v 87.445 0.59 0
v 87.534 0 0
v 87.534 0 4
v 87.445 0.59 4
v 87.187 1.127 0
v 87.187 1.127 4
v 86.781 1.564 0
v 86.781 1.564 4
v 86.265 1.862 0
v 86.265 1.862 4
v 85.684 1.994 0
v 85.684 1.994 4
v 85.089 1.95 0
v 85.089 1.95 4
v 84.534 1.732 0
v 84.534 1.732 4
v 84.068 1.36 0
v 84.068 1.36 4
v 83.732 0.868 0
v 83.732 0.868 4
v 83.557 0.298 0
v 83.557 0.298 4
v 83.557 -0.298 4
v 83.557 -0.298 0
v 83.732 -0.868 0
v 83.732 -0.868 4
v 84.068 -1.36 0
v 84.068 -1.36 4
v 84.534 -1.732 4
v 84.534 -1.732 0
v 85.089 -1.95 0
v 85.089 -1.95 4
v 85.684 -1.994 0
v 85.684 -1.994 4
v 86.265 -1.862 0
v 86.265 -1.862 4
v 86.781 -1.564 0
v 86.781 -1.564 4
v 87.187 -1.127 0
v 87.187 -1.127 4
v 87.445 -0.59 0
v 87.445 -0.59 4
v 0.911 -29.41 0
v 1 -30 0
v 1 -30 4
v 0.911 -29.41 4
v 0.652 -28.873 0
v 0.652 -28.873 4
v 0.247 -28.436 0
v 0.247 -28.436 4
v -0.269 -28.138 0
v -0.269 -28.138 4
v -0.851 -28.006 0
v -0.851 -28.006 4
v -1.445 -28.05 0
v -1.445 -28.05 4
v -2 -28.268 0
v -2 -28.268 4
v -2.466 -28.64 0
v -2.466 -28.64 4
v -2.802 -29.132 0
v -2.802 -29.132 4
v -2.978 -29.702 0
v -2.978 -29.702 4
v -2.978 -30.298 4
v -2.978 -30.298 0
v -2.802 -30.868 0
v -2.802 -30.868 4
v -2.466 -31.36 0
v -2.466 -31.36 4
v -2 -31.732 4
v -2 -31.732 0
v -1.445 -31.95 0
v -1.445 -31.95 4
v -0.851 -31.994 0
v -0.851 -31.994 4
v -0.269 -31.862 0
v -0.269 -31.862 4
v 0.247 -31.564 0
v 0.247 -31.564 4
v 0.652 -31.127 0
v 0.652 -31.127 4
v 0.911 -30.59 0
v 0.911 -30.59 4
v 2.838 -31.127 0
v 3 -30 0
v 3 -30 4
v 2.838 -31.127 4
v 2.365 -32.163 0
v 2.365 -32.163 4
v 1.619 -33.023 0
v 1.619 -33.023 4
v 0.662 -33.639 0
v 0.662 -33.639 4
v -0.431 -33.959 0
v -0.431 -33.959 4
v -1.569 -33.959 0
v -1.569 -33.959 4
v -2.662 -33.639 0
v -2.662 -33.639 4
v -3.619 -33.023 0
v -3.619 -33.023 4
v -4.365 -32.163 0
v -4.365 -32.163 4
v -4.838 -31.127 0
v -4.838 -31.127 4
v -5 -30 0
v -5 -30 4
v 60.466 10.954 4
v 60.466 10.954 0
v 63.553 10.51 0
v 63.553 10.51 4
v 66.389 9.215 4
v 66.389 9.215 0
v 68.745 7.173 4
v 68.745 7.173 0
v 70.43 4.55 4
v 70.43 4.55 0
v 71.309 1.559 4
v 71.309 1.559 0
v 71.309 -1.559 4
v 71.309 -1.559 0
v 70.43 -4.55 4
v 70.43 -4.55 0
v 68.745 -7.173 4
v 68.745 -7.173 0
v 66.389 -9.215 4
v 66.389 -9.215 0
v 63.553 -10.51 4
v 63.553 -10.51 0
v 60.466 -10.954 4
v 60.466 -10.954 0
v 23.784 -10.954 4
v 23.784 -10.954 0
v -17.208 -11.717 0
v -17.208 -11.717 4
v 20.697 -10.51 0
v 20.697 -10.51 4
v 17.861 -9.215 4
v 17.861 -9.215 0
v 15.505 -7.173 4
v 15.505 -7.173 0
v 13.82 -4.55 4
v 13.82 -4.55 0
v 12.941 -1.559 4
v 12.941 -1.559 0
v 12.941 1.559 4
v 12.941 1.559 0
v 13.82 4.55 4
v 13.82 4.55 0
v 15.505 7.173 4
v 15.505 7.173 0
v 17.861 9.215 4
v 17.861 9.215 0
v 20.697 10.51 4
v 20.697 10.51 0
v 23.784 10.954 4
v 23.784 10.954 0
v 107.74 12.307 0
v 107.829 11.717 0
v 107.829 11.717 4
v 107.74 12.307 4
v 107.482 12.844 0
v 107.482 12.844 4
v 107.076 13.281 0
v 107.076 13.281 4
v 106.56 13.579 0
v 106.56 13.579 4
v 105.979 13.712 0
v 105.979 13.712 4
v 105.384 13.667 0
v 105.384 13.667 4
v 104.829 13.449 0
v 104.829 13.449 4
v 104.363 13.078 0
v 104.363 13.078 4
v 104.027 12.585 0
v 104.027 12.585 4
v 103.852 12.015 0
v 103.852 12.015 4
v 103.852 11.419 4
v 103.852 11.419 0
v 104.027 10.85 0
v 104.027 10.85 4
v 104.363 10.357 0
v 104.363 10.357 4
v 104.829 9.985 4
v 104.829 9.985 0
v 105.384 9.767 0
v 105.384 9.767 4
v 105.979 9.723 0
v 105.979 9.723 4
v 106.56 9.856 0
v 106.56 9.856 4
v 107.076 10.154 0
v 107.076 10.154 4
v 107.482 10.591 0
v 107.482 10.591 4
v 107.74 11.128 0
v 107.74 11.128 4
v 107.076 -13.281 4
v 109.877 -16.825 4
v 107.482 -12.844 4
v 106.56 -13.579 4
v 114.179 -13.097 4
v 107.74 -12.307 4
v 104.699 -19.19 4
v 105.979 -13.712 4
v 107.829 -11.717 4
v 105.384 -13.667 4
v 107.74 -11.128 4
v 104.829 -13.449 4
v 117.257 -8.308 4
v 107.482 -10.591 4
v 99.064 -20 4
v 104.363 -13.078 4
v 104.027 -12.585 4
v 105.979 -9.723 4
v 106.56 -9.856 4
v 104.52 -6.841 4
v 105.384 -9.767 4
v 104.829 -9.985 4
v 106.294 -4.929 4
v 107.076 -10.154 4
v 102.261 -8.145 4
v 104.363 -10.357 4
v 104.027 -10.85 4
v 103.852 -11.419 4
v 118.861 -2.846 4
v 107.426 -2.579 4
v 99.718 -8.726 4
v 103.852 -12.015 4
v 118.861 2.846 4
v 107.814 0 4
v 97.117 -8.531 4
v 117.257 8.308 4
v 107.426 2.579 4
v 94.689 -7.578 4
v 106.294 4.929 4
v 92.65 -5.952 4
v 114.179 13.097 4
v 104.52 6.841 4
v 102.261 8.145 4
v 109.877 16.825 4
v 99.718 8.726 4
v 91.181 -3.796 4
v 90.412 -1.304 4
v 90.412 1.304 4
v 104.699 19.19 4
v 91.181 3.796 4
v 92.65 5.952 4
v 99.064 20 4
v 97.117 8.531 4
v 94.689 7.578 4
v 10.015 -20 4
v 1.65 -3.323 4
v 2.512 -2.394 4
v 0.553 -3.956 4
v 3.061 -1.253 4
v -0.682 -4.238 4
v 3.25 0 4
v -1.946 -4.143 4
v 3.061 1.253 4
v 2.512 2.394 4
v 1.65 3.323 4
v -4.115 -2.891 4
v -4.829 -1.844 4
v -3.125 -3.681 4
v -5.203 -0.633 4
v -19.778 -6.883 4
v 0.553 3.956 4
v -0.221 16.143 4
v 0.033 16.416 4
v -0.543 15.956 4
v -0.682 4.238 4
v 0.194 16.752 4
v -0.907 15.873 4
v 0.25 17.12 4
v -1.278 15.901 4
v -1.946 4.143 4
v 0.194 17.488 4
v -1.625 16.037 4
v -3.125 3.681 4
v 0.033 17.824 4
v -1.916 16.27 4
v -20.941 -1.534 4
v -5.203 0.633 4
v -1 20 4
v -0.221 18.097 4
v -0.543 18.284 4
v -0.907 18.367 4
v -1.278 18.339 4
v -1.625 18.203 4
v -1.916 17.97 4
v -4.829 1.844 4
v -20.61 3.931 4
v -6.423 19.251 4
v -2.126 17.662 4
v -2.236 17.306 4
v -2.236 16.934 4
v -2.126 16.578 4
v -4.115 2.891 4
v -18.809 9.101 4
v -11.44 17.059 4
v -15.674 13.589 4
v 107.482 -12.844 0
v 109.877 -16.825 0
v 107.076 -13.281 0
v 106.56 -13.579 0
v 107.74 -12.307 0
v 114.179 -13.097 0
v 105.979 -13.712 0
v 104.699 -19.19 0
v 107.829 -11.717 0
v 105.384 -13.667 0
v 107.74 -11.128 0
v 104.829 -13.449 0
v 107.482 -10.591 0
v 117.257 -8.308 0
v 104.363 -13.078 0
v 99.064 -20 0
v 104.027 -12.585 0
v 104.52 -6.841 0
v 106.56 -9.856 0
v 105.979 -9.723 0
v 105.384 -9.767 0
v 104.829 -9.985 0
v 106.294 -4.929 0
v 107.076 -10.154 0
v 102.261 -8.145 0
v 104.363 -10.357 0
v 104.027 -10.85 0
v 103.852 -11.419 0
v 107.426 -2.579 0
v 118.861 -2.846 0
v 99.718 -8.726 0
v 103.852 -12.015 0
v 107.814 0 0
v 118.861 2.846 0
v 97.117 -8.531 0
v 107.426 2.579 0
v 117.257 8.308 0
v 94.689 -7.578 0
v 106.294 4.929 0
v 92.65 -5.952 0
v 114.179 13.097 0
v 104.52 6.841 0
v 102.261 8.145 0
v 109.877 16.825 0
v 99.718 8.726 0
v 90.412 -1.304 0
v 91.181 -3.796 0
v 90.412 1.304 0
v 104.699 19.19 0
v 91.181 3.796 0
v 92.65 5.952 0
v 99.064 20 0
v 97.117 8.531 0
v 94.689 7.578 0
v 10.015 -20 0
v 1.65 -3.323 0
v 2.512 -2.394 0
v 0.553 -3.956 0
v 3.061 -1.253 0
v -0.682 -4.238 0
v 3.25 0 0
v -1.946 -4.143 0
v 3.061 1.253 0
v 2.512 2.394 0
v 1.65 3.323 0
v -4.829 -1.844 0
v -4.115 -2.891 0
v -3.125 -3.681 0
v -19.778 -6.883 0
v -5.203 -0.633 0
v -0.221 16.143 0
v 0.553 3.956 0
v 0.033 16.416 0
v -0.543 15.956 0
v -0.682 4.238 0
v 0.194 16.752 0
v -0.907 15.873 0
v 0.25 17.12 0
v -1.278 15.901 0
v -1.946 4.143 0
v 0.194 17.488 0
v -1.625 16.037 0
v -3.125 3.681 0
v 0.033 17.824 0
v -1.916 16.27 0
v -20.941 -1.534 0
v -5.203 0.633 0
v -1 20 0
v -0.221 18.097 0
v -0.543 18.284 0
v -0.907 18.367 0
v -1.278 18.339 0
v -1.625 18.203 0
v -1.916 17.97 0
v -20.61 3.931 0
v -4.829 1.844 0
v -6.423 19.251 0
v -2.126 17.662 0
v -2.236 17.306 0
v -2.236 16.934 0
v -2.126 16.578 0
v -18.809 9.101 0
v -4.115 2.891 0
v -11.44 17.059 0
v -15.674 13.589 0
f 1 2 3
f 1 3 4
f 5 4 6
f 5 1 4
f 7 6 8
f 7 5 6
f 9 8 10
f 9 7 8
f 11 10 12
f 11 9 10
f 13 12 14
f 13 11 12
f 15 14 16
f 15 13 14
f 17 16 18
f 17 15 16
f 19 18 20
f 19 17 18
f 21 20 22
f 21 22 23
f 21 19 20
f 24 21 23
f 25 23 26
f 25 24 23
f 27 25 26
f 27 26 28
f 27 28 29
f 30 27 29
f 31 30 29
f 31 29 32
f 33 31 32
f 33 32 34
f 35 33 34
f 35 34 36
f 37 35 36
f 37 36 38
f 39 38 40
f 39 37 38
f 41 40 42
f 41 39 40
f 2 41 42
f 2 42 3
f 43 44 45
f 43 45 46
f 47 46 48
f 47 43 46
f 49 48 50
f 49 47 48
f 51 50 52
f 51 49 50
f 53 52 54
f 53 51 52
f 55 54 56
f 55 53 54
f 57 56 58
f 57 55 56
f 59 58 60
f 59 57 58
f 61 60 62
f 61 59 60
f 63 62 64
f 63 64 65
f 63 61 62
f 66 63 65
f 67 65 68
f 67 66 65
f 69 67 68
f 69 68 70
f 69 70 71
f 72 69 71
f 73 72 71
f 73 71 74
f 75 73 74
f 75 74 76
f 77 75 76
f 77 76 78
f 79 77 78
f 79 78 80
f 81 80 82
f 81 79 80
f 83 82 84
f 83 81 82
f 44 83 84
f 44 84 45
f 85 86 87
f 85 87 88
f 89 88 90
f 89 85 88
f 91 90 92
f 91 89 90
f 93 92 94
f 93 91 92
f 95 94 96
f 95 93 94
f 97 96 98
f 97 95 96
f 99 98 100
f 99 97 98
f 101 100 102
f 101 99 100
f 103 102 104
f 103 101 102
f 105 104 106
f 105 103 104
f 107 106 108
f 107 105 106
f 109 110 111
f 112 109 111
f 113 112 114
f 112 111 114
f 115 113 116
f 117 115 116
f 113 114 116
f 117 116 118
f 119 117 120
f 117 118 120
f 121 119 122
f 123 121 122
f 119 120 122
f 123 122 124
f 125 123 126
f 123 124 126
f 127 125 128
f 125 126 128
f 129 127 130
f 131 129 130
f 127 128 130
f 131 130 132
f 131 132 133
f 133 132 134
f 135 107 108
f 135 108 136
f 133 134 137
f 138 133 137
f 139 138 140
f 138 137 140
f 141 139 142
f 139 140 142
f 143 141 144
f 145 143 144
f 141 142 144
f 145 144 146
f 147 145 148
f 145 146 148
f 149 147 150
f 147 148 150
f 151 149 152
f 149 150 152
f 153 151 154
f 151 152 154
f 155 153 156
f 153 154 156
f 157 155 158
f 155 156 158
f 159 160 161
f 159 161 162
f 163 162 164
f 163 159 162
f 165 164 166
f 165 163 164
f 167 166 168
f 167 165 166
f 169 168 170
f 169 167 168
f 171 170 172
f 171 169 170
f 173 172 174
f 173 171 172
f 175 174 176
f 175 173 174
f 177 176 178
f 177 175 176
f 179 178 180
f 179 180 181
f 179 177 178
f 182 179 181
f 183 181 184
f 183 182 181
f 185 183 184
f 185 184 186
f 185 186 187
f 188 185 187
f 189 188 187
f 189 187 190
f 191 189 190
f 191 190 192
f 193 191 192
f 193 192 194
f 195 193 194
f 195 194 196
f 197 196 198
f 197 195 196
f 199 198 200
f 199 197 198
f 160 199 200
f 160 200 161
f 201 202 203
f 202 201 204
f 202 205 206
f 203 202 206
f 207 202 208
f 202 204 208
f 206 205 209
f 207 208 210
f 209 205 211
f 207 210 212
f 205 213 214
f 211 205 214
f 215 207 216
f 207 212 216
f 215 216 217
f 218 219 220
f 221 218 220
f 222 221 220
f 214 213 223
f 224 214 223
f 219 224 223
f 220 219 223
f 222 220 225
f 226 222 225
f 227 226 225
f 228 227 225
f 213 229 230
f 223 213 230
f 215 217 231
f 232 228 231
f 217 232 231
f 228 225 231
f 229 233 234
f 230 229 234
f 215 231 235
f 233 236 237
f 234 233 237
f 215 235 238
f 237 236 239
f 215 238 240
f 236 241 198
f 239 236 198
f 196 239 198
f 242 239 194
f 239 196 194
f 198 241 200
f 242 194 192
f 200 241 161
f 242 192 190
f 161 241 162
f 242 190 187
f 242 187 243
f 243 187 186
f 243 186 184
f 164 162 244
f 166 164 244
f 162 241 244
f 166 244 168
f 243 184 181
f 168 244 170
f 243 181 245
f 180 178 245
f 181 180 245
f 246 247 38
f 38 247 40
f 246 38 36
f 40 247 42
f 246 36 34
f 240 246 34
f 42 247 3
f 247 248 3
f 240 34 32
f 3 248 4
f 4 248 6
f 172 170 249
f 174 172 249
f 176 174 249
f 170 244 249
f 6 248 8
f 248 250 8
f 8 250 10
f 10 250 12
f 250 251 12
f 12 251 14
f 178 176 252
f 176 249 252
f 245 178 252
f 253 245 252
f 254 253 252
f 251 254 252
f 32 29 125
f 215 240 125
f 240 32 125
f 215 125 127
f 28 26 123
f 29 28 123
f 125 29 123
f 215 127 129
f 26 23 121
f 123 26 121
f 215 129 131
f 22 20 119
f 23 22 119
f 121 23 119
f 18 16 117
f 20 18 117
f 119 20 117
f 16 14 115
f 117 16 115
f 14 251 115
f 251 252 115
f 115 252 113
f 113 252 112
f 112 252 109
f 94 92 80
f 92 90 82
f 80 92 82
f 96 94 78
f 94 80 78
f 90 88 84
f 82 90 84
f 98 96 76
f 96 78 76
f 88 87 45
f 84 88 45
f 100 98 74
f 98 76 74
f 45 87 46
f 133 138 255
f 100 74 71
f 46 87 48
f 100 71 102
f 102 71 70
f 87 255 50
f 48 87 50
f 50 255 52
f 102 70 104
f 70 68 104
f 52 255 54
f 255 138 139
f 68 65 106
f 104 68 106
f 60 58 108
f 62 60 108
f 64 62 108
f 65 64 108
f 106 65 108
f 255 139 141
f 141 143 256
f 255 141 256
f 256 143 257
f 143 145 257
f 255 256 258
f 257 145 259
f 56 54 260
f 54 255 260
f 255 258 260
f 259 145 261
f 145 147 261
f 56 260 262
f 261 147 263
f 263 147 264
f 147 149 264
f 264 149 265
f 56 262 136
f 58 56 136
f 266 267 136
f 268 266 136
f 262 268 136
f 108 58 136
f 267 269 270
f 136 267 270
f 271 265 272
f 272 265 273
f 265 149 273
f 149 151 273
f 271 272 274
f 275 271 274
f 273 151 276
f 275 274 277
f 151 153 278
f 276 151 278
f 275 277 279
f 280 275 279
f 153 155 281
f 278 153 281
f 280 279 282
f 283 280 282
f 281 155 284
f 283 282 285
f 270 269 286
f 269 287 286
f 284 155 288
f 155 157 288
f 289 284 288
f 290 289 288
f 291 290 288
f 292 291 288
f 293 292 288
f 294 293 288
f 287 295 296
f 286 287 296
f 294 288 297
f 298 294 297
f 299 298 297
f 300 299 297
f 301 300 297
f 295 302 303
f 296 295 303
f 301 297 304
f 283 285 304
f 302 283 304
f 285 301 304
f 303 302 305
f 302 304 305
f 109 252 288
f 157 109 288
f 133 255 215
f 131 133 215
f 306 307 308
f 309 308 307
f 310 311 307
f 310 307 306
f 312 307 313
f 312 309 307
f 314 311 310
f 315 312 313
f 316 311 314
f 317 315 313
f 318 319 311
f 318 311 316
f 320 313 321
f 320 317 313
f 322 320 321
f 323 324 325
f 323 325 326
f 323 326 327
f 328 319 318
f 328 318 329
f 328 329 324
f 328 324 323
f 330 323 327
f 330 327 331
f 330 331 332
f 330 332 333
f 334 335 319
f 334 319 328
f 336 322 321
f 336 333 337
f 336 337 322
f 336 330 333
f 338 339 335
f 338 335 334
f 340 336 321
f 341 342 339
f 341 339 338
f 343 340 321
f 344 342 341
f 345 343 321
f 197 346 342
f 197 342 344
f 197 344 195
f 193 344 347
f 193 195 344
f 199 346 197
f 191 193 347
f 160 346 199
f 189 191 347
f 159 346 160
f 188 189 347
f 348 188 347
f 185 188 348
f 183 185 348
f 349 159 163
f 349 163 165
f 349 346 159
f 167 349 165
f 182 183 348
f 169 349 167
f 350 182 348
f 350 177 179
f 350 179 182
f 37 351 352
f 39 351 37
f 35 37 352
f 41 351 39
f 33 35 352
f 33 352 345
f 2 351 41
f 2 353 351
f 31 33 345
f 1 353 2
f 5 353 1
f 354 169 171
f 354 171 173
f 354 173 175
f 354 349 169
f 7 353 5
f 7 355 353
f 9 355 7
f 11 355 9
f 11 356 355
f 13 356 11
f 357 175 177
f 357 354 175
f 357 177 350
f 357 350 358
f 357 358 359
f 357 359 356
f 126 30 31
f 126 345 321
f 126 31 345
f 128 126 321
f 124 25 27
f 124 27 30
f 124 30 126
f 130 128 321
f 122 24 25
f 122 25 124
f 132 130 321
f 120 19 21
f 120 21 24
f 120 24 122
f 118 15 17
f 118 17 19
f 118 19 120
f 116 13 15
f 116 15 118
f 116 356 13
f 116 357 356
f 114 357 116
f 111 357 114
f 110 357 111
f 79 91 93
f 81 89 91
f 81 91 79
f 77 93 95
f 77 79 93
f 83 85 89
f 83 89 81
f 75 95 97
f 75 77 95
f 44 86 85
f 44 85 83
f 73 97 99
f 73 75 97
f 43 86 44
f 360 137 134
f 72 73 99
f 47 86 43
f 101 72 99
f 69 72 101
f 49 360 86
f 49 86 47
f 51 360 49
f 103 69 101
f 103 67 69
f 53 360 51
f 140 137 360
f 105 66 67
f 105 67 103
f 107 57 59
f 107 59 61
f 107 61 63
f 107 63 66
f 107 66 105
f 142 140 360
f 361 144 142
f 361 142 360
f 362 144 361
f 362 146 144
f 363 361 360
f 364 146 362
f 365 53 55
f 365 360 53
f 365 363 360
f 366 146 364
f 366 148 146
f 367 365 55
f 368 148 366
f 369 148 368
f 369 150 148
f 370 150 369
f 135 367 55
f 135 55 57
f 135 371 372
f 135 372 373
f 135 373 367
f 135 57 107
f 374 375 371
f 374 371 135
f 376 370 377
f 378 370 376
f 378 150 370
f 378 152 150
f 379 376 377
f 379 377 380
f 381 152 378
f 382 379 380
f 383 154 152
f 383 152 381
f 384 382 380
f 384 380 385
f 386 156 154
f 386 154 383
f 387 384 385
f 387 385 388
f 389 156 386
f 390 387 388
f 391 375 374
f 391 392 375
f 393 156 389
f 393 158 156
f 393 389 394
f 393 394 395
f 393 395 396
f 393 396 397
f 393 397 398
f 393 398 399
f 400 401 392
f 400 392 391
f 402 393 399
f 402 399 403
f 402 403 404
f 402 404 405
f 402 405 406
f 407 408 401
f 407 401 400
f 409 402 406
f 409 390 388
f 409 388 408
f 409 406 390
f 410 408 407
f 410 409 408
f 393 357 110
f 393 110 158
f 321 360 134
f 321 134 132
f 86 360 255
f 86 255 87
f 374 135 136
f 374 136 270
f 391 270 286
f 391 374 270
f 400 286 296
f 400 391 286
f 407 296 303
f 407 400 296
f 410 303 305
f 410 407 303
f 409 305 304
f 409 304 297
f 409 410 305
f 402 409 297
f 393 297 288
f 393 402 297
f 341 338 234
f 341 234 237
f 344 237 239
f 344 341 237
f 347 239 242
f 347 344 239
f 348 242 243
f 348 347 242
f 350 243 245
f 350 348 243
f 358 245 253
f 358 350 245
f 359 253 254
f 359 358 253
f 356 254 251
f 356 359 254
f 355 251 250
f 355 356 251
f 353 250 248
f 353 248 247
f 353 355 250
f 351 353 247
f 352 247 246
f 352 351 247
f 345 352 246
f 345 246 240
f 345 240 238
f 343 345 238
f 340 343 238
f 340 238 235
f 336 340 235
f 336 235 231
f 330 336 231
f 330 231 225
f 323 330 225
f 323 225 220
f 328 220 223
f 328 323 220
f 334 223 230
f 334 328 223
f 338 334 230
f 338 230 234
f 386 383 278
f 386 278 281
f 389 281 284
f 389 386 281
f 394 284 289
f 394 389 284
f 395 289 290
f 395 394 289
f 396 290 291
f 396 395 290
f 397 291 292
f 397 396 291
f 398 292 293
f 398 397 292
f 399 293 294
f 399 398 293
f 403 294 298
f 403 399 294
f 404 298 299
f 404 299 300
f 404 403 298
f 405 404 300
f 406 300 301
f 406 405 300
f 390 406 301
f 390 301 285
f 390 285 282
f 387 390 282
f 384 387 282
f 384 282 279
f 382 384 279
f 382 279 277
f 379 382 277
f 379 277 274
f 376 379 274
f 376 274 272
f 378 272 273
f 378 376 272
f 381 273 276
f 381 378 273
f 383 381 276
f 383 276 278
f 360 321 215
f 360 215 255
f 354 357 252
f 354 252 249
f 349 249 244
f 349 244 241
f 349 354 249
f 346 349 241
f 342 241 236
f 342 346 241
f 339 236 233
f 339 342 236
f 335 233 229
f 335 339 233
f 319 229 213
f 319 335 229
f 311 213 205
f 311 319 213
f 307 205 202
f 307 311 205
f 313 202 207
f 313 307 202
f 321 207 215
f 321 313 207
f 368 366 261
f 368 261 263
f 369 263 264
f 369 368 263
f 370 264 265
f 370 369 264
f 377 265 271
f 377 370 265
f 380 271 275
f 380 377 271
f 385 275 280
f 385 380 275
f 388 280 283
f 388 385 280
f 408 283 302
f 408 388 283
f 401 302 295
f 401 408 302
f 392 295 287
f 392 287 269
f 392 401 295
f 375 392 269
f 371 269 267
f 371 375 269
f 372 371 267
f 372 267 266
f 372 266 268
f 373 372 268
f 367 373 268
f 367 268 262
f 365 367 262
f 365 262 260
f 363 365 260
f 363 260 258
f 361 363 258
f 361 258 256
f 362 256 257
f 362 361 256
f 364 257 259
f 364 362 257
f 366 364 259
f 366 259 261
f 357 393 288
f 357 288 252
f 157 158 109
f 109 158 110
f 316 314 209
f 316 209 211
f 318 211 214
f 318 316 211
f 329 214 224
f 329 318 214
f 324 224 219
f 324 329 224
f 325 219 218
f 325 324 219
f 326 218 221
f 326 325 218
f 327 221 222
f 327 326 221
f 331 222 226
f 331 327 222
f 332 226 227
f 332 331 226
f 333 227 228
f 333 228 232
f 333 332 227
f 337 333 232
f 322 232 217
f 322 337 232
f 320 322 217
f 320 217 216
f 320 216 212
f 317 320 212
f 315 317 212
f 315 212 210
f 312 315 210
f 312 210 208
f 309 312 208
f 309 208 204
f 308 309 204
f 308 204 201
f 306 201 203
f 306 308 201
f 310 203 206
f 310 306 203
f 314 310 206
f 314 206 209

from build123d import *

# Parameters (mm, degrees)
SKETCH_1_R      = 4.25
SKETCH_1_R_2    = 8.75
SKETCH_1_R_3    = 2
SKETCH_1_R_4    = 1.25
EXTRUDE_1_DEPTH = 4


with BuildPart() as part:
    # 草图1 → 凸台-拉伸1 (new body)
    with BuildSketch(Plane.XY):
        with BuildLine():
            Line((-1, 20), (99.064295006, 20))
            ThreePointArc((99.064295006, 20), (119.064295006, 0), (99.064295006, -20))
            Line((99.064295006, -20), (10.014533743, -20))
            Line((10.014533743, -20), (3, -30))
            ThreePointArc((3, -30), (-1, -34), (-5, -30))
            Line((-5, -30), (-17.208156126, -11.717323713))
            ThreePointArc((-17.208156126, -11.717323713), (-18.809358134, 9.10092099), (-1, 20))
        make_face()
        with Locations((-1, 0)):
            Circle(SKETCH_1_R, mode=Mode.SUBTRACT)
        with Locations((99.064295006, 0)):
            Circle(SKETCH_1_R_2, mode=Mode.SUBTRACT)
        with Locations((85.534295006, 0)):
            Circle(SKETCH_1_R_3, mode=Mode.SUBTRACT)
        with Locations((105.829295006, 11.717323713)):
            Circle(SKETCH_1_R_3, mode=Mode.SUBTRACT)
        with Locations((105.829295006, -11.717323713)):
            Circle(SKETCH_1_R_3, mode=Mode.SUBTRACT)
        with Locations((-1, -30)):
            Circle(SKETCH_1_R_3, mode=Mode.SUBTRACT)
        with Locations((-1, 17.12)):
            Circle(SKETCH_1_R_4, mode=Mode.SUBTRACT)
        with BuildLine():
            Line((23.78352134, 10.95385289), (60.46647866, 10.95385289))
            ThreePointArc((60.46647866, 10.95385289), (71.420331549, 0), (60.46647866, -10.95385289))
            Line((60.46647866, -10.95385289), (23.78352134, -10.95385289))
            ThreePointArc((23.78352134, -10.95385289), (12.829668451, 0), (23.78352134, 10.95385289))
        make_face(mode=Mode.SUBTRACT)
    extrude(amount=EXTRUDE_1_DEPTH)


solid = part.part
